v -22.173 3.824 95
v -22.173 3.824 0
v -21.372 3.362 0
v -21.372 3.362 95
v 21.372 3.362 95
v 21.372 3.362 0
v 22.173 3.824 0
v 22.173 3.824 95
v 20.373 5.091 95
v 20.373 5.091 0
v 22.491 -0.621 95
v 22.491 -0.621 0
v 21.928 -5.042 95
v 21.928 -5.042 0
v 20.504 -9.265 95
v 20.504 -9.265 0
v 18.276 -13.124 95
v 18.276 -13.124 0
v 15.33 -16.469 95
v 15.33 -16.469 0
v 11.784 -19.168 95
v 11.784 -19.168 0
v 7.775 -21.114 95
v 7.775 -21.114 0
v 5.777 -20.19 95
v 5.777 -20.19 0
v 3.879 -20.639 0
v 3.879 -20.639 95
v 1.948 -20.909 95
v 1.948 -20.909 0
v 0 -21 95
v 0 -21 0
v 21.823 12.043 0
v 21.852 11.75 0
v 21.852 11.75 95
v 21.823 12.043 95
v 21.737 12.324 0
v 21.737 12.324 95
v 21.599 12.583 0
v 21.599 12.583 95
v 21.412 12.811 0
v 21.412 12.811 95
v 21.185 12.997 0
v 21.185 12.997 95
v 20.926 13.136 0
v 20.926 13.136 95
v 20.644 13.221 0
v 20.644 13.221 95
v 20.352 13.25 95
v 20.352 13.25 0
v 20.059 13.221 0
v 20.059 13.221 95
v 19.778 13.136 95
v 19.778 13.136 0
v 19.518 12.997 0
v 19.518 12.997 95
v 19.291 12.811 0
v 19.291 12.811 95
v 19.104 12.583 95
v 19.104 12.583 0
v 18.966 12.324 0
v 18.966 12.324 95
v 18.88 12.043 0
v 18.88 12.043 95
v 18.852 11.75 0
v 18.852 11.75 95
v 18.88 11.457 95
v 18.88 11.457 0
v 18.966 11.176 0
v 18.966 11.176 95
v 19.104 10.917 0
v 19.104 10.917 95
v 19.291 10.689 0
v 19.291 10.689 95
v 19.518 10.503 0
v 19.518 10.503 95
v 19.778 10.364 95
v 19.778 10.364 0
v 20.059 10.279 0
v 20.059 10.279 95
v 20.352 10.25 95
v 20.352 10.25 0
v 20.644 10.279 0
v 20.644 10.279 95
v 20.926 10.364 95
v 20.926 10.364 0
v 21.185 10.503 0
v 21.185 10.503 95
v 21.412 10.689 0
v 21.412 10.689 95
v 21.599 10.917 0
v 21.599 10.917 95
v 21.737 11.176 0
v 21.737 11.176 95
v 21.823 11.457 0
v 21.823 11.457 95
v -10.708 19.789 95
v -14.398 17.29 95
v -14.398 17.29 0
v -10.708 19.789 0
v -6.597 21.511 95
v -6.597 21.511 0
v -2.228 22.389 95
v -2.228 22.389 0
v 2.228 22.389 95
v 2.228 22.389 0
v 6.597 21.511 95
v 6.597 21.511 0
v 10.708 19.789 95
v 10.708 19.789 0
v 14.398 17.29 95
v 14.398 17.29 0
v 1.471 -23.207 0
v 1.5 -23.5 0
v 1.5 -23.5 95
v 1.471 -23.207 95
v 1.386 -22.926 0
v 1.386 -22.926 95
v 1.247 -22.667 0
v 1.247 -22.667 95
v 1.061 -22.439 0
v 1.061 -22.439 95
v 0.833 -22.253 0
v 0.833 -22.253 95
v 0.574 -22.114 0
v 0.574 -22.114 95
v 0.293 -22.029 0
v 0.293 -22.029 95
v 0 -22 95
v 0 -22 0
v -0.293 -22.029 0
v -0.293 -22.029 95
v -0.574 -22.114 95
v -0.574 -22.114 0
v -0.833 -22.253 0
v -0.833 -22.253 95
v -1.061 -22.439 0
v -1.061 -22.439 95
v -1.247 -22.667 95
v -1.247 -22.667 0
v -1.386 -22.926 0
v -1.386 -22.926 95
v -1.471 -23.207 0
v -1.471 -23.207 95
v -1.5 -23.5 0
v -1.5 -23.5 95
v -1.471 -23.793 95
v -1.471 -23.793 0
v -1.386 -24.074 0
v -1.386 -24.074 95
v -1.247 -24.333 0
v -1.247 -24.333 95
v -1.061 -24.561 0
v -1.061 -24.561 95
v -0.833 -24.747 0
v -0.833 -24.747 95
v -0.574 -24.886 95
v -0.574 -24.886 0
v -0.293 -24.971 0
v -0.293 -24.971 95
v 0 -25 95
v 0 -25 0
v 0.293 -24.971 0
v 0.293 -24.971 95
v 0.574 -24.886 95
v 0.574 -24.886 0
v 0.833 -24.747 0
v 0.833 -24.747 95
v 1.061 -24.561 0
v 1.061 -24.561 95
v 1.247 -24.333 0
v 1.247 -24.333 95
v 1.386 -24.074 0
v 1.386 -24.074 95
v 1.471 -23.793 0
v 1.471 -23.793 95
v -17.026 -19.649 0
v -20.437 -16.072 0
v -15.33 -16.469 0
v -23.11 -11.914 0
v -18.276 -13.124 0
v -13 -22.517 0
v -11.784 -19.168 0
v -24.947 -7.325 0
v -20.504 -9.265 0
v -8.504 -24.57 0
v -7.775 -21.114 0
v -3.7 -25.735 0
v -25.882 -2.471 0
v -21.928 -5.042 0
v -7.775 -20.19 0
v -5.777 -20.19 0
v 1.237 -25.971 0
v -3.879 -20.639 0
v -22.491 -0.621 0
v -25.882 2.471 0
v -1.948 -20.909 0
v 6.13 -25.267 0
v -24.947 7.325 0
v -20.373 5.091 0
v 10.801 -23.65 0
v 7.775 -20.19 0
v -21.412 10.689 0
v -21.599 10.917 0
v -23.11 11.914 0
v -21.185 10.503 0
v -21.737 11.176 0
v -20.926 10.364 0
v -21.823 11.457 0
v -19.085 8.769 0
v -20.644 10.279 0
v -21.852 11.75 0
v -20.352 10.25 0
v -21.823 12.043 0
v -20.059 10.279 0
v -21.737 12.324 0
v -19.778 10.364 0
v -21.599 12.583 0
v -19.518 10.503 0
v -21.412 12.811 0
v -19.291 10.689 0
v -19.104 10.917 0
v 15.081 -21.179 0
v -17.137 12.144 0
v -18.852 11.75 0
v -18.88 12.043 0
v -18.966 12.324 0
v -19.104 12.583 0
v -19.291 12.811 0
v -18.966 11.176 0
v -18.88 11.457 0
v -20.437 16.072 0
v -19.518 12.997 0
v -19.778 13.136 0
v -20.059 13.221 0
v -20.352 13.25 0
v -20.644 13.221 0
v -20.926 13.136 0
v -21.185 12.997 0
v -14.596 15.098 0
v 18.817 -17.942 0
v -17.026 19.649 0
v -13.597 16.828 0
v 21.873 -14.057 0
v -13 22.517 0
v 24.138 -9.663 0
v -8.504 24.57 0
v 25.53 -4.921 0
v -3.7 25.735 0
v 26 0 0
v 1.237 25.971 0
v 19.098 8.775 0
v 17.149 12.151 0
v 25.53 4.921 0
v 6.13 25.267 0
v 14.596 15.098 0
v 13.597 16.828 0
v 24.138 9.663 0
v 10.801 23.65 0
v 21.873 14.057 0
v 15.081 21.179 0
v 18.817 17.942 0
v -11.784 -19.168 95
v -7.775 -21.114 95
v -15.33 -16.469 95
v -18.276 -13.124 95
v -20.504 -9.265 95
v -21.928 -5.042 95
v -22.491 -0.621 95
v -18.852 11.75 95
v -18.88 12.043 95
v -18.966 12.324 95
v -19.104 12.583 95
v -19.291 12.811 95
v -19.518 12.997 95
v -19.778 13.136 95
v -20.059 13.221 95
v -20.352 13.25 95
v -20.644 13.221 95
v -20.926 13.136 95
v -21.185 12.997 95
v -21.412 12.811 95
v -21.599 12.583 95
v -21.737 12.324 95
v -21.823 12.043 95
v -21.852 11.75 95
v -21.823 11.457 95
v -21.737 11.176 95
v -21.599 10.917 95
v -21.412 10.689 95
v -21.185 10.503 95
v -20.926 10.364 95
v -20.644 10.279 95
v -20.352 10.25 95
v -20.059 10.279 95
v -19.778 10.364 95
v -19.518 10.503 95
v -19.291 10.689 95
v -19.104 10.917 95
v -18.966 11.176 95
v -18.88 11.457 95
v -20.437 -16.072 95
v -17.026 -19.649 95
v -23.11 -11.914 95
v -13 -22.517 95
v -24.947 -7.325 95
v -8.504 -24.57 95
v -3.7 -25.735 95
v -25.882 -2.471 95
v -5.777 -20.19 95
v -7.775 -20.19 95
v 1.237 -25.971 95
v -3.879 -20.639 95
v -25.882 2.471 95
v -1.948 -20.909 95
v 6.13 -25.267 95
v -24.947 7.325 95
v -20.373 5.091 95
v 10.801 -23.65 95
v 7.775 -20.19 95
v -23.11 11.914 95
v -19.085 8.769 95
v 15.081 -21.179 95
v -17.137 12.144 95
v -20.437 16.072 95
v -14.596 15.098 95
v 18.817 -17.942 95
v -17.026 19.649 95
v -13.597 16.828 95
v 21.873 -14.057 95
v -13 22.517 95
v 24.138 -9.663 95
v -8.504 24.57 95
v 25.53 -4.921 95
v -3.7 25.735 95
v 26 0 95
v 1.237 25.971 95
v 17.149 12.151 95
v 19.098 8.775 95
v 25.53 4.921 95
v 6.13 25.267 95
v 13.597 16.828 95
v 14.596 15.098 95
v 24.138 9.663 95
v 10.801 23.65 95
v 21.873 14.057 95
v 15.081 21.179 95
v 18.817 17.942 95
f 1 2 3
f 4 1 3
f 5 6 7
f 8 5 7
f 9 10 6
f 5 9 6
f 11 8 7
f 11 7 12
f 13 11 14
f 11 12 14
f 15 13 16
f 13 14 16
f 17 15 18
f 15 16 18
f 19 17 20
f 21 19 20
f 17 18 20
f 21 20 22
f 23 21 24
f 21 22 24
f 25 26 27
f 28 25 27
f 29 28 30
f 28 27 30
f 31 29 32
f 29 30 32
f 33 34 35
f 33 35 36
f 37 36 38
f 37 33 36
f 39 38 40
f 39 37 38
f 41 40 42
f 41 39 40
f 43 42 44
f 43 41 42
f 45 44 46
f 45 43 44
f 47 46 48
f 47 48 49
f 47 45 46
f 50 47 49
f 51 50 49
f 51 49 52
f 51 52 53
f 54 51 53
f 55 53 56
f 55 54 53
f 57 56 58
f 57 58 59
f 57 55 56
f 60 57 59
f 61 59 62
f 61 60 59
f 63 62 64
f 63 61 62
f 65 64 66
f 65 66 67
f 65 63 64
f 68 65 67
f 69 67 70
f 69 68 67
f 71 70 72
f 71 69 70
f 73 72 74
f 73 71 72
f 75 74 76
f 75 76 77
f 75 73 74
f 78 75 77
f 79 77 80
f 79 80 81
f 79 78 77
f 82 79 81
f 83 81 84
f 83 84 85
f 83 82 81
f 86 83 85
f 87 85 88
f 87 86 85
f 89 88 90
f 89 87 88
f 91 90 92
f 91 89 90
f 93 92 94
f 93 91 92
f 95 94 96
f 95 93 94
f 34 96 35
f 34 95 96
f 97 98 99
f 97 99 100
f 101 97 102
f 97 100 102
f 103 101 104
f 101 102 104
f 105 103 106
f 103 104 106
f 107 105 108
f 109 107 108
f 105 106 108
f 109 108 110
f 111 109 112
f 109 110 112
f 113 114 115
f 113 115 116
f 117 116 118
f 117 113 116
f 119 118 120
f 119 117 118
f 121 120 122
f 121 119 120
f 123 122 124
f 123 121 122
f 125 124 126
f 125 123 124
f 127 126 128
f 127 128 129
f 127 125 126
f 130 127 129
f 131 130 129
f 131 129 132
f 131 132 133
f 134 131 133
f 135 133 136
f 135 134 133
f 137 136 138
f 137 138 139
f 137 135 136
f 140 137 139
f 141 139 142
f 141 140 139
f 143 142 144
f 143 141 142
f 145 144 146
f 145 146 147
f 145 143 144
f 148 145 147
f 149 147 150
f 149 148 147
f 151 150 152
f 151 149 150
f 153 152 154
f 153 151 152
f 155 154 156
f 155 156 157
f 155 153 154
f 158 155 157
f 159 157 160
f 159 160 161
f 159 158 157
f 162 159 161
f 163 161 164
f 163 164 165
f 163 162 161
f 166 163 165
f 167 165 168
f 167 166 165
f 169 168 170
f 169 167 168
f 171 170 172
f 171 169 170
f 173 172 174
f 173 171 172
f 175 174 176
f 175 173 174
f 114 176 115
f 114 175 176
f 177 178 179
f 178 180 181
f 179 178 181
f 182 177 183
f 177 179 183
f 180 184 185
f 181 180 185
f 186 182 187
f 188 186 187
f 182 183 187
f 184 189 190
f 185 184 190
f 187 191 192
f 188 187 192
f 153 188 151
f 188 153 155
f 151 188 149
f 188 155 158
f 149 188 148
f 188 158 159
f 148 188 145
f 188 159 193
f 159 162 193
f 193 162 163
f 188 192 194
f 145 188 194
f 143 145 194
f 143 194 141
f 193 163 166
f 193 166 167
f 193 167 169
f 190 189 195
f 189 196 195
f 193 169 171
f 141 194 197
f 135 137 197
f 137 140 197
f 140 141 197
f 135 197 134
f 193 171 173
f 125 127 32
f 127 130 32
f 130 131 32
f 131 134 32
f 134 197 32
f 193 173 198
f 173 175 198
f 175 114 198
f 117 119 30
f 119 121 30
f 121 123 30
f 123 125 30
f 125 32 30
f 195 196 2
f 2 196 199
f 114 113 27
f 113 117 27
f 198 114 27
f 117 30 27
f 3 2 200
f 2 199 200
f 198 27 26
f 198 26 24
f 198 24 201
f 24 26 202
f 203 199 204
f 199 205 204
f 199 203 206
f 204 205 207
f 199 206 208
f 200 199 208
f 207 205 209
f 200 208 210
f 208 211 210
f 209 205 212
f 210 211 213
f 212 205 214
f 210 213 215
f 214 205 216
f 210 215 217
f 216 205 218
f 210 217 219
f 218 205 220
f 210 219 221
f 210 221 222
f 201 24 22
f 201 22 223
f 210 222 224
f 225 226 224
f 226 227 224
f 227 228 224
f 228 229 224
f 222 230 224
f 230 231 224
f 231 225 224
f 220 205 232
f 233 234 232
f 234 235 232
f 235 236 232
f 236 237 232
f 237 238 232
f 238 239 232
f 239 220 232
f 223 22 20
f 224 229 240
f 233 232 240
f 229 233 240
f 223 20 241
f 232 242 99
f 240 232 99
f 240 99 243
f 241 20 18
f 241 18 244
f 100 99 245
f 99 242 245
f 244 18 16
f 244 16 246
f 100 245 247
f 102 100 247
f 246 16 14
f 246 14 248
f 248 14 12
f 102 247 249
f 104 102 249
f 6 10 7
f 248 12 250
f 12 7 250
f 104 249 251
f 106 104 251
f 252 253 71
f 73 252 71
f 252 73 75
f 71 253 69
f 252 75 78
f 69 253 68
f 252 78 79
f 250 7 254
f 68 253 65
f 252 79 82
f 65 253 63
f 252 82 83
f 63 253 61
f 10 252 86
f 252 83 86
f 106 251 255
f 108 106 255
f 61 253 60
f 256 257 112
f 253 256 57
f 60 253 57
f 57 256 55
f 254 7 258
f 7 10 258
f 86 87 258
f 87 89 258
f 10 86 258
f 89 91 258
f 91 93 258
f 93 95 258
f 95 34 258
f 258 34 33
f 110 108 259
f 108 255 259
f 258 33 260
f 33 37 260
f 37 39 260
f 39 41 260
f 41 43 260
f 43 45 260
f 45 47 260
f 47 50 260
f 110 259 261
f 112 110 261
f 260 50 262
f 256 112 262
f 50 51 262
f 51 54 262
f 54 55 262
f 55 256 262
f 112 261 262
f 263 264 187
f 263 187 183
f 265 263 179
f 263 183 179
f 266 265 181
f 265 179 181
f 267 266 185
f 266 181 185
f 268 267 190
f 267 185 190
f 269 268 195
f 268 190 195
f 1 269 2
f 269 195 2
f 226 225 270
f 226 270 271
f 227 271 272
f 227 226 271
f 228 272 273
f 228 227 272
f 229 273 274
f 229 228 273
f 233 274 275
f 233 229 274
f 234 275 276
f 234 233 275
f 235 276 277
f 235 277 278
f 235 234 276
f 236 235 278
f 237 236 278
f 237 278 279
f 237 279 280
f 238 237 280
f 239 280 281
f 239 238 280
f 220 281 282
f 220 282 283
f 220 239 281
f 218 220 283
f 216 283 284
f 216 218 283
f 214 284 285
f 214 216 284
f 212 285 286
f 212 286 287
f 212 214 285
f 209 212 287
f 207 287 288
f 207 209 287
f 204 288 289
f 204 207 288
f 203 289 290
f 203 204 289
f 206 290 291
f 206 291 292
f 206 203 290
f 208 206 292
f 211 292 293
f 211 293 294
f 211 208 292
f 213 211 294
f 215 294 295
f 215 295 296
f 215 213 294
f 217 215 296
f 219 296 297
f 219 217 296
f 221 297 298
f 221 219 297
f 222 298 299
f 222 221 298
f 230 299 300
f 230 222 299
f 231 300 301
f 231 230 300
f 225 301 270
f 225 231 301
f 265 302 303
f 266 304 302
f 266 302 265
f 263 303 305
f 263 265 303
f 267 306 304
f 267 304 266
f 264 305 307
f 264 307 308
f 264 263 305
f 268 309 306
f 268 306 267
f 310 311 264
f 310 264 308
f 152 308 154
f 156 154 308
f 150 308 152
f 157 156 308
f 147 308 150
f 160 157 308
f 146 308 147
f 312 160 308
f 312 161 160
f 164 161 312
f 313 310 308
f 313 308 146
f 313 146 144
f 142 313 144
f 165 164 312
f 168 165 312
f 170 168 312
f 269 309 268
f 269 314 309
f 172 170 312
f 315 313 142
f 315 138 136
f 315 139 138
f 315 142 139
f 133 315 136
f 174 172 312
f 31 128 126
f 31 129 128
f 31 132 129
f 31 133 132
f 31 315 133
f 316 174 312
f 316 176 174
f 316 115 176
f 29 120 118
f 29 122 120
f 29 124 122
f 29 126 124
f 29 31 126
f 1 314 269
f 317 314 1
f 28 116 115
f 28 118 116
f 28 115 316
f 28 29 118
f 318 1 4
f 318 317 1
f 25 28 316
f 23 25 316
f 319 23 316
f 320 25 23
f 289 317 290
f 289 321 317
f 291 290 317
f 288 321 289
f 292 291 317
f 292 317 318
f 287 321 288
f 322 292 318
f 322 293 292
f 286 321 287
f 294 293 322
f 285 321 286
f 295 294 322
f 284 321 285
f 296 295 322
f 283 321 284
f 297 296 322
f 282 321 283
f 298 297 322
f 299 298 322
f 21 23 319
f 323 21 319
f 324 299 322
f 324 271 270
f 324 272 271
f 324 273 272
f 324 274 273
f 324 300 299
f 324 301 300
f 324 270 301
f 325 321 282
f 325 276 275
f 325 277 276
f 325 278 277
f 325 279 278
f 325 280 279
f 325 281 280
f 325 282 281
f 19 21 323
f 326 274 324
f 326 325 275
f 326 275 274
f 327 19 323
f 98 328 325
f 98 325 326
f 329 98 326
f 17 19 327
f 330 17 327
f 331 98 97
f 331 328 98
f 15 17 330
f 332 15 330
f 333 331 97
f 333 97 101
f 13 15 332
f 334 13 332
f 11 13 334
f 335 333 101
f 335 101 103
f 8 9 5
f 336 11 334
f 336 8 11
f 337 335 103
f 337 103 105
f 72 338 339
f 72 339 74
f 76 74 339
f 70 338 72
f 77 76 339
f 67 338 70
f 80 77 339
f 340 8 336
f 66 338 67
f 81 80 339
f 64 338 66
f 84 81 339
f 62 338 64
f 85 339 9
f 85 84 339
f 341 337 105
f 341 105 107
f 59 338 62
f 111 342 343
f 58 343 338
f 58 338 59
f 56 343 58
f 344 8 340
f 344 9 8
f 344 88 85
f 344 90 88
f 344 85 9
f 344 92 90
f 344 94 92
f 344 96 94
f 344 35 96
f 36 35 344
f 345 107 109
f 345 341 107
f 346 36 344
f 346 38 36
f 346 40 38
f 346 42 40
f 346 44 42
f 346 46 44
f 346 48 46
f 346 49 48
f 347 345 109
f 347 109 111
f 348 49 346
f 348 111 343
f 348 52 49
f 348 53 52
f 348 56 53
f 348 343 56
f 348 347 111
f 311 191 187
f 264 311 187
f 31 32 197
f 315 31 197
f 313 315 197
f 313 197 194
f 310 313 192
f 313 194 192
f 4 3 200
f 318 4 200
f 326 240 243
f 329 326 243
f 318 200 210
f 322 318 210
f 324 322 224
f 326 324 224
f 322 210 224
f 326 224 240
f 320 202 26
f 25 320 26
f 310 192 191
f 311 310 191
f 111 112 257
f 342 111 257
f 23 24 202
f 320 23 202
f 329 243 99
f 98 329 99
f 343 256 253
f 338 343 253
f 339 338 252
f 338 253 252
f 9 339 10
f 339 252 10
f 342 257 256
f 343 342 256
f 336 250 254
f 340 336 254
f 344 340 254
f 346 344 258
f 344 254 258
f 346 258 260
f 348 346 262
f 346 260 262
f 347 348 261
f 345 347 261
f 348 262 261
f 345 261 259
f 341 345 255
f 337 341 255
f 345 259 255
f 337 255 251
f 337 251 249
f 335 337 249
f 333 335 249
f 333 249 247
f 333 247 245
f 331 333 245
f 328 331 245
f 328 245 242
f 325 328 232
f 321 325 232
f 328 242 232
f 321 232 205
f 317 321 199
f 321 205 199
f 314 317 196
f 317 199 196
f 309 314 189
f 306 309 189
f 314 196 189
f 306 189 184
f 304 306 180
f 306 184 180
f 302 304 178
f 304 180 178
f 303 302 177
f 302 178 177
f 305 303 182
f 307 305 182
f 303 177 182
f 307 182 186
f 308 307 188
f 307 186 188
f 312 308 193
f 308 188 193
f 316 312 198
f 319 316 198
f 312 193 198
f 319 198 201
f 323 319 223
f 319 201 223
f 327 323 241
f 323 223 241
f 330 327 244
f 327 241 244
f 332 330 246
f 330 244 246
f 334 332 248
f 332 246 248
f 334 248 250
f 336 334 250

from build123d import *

# Parameters (mm, degrees)
F0_R     = 26
F0_R_2   = 1.5
F1_DEPTH = 95


with BuildPart() as f1:
    # F0 (on Top) → F1 (new body)
    with BuildSketch(Plane.XY):
        Circle(F0_R)
        with Locations((0, -23.5)):
            Circle(F0_R_2, mode=Mode.SUBTRACT)
        with Locations((-20.3515969889, 11.75)):
            Circle(F0_R_2, mode=Mode.SUBTRACT)
        with BuildLine():
            ThreePointArc((22.1726827981, 3.8238903663), (19.4855715851, -11.25), (7.7747552005, -21.1140517564))
            Line((7.7747552005, -21.1140517564), (7.7747552005, -20.1896557547))
            Line((7.7747552005, -20.1896557547), (5.7773523787, -20.1896557547))
            ThreePointArc((5.7773523787, -20.1896557547), (2.9169529609, -20.7964272274), (0, -21))
            ThreePointArc((0, -21), (-2.9169529609, -20.7964272274), (-5.7773523787, -20.1896557547))
            Line((-5.7773523787, -20.1896557547), (-7.7747552005, -20.1896557547))
            Line((-7.7747552005, -20.1896557547), (-7.7747552005, -21.1140517564))
            ThreePointArc((-7.7747552005, -21.1140517564), (-19.4855715851, -11.25), (-22.1726827981, 3.8238903663))
            Line((-22.1726827981, 3.8238903663), (-21.3721323775, 3.3616923655))
            Line((-21.3721323775, 3.3616923655), (-20.3734309666, 5.0914939507))
            ThreePointArc((-20.3734309666, 5.0914939507), (-18.1896766972, 10.5018147376), (-14.5960785878, 15.0981618039))
            Line((-14.5960785878, 15.0981618039), (-13.5973771769, 16.8279633892))
            Line((-13.5973771769, 16.8279633892), (-14.3979275976, 17.2901613901))
            ThreePointArc((-14.3979275976, 17.2901613901), (0, 22.5), (14.3979275976, 17.2901613901))
            Line((14.3979275976, 17.2901613901), (13.5973771769, 16.8279633892))
            Line((13.5973771769, 16.8279633892), (14.5960785878, 15.0981618039))
            ThreePointArc((14.5960785878, 15.0981618039), (18.2034997005, 10.5097954523), (20.3734309666, 5.0914939507))
            Line((20.3734309666, 5.0914939507), (21.3721323775, 3.3616923655))
            Line((21.3721323775, 3.3616923655), (22.1726827981, 3.8238903663))
        make_face(mode=Mode.SUBTRACT)
        with Locations((20.3515969889, 11.75)):
            Circle(F0_R_2, mode=Mode.SUBTRACT)
    extrude(amount=F1_DEPTH)


solid = f1.part
